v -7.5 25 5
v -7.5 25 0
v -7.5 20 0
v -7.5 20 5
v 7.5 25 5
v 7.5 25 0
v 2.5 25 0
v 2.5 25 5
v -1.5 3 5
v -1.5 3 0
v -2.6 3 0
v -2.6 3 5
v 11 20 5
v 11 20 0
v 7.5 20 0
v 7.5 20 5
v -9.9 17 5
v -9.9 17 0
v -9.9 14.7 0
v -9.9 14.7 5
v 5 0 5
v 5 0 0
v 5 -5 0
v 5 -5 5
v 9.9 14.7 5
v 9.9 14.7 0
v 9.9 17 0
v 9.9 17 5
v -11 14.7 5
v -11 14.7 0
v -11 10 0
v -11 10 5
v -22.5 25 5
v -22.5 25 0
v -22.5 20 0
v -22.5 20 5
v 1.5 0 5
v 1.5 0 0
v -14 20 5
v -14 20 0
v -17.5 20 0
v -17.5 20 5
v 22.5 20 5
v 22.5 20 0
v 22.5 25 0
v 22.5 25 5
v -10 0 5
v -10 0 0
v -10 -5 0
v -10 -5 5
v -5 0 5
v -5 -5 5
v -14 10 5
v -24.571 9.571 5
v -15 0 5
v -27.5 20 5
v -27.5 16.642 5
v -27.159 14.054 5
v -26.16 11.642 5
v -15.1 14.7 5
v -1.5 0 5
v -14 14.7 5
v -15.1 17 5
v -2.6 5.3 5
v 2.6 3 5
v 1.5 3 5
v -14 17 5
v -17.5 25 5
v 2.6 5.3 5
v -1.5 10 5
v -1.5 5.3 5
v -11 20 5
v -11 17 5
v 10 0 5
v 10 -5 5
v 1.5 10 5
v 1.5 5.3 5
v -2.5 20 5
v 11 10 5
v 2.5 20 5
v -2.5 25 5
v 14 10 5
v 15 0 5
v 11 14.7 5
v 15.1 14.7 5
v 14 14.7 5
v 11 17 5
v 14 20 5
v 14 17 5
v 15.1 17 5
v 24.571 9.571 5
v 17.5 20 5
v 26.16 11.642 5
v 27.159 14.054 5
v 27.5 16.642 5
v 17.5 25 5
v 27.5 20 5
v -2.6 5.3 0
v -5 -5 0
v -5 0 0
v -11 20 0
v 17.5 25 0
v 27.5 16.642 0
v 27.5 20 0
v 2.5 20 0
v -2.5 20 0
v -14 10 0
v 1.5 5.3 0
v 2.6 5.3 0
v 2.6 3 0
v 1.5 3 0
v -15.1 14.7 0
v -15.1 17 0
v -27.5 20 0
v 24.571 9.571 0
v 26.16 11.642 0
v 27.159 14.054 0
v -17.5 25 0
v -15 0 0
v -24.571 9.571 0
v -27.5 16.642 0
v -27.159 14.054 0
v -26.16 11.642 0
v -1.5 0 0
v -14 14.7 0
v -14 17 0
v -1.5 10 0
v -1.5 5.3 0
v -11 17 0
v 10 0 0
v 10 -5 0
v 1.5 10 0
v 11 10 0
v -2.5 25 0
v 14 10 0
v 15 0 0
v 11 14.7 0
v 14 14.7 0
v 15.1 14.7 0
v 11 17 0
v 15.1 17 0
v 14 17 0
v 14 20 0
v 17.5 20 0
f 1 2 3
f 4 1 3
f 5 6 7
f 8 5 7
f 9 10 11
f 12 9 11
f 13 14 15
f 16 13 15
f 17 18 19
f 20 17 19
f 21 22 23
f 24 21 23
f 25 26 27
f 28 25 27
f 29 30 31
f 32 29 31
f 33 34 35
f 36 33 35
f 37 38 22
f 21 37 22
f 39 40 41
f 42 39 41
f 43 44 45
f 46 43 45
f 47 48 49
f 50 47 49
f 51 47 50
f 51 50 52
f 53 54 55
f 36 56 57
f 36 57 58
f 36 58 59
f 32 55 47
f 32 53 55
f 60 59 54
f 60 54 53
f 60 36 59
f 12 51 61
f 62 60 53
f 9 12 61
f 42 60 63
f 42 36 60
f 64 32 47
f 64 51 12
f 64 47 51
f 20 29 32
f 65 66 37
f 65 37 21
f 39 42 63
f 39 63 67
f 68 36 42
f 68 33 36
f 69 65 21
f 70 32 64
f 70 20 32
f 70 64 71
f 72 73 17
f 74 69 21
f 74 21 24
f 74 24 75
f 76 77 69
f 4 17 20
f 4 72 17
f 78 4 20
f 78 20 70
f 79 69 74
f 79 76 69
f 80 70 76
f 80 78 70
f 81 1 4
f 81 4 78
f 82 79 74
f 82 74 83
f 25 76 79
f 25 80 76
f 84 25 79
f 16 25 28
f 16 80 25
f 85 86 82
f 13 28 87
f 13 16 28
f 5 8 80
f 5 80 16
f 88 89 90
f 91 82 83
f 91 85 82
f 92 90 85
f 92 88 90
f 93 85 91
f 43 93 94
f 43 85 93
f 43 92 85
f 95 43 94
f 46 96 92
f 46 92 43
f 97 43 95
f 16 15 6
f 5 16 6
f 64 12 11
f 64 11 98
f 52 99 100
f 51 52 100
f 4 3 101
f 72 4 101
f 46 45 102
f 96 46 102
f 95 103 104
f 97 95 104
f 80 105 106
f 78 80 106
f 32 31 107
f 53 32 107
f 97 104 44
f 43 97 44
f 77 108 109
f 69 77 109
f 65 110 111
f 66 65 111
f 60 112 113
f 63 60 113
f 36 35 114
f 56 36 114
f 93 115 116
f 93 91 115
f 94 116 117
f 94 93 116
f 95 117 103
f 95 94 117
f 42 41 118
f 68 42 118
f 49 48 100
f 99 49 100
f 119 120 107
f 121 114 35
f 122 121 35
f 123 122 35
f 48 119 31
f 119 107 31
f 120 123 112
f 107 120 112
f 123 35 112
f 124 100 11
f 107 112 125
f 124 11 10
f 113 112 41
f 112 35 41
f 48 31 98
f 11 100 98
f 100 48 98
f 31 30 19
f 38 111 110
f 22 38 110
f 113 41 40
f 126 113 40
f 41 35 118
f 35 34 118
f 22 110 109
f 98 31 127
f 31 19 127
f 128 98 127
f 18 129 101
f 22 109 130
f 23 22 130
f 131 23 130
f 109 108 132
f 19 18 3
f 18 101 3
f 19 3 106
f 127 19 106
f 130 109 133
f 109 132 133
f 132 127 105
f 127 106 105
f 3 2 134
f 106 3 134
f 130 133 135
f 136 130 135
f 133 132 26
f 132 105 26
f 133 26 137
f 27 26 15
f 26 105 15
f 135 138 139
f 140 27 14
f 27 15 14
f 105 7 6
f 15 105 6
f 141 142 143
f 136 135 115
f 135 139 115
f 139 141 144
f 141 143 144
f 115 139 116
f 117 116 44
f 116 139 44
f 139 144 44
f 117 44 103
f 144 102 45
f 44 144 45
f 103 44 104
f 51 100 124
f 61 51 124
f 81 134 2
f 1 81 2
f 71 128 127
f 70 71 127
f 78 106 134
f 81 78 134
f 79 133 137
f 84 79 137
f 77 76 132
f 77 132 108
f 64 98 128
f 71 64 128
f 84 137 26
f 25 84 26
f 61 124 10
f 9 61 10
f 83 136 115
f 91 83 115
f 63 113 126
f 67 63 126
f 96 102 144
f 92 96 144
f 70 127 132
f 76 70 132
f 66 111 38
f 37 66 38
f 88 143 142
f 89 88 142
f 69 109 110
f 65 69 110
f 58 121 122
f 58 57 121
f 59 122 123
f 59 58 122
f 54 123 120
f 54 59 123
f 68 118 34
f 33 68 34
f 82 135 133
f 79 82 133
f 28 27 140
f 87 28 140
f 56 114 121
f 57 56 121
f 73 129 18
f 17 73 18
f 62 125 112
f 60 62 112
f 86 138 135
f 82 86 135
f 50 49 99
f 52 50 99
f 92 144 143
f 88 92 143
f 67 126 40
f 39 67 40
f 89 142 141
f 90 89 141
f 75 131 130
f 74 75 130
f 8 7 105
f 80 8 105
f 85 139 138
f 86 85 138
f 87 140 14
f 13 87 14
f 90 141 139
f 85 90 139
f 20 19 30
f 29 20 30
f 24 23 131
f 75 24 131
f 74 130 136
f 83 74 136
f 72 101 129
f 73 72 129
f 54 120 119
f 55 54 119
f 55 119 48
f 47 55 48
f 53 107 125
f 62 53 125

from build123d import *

# Parameters (mm, degrees)
BOSS_EXTRU_1_DEPTH = 5
CONG_1_R           = 10


with BuildPart() as part:
    # Esquisse1 → Boss.-Extru.1 (new body)
    with BuildSketch(Plane.XY):
        Polygon((15, 0), (27.5, 12.5), (27.5, 20), (22.5, 20), (22.5, 25), (17.5, 25), (17.5, 20), (14, 20), (14, 17), (15.1, 17), (15.1, 14.7), (14, 14.7), (14, 10), (11, 10), (11, 14.7), (9.9, 14.7), (9.9, 17), (11, 17), (11, 20), (7.5, 20), (7.5, 25), (2.5, 25), (2.5, 20), (-2.5, 20), (-2.5, 25), (-7.5, 25), (-7.5, 20), (-11, 20), (-11, 17), (-9.9, 17), (-9.9, 14.7), (-11, 14.7), (-11, 10), (-14, 10), (-14, 14.7), (-15.1, 14.7), (-15.1, 17), (-14, 17), (-14, 20), (-17.5, 20), (-17.5, 25), (-22.5, 25), (-22.5, 20), (-27.5, 20), (-27.5, 12.5), (-15, 0), (-10, 0), (-10, -5), (-5, -5), (-5, 0), (-1.5, 0), (-1.5, 3), (-2.6, 3), (-2.6, 5.3), (-1.5, 5.3), (-1.5, 10), (1.5, 10), (1.5, 5.3), (2.6, 5.3), (2.6, 3), (1.5, 3), (1.5, 0), (5, 0), (5, -5), (10, -5), (10, 0), align=None)
    extrude(amount=BOSS_EXTRU_1_DEPTH)

    # Congé1
    cong_1_edges = [part.edges().sort_by_distance(p)[0] for p in [
        (27.5, 12.5, 2.5),
        (-27.5, 12.5, 2.5),
    ]]
    fillet(cong_1_edges, radius=CONG_1_R)


solid = part.part
